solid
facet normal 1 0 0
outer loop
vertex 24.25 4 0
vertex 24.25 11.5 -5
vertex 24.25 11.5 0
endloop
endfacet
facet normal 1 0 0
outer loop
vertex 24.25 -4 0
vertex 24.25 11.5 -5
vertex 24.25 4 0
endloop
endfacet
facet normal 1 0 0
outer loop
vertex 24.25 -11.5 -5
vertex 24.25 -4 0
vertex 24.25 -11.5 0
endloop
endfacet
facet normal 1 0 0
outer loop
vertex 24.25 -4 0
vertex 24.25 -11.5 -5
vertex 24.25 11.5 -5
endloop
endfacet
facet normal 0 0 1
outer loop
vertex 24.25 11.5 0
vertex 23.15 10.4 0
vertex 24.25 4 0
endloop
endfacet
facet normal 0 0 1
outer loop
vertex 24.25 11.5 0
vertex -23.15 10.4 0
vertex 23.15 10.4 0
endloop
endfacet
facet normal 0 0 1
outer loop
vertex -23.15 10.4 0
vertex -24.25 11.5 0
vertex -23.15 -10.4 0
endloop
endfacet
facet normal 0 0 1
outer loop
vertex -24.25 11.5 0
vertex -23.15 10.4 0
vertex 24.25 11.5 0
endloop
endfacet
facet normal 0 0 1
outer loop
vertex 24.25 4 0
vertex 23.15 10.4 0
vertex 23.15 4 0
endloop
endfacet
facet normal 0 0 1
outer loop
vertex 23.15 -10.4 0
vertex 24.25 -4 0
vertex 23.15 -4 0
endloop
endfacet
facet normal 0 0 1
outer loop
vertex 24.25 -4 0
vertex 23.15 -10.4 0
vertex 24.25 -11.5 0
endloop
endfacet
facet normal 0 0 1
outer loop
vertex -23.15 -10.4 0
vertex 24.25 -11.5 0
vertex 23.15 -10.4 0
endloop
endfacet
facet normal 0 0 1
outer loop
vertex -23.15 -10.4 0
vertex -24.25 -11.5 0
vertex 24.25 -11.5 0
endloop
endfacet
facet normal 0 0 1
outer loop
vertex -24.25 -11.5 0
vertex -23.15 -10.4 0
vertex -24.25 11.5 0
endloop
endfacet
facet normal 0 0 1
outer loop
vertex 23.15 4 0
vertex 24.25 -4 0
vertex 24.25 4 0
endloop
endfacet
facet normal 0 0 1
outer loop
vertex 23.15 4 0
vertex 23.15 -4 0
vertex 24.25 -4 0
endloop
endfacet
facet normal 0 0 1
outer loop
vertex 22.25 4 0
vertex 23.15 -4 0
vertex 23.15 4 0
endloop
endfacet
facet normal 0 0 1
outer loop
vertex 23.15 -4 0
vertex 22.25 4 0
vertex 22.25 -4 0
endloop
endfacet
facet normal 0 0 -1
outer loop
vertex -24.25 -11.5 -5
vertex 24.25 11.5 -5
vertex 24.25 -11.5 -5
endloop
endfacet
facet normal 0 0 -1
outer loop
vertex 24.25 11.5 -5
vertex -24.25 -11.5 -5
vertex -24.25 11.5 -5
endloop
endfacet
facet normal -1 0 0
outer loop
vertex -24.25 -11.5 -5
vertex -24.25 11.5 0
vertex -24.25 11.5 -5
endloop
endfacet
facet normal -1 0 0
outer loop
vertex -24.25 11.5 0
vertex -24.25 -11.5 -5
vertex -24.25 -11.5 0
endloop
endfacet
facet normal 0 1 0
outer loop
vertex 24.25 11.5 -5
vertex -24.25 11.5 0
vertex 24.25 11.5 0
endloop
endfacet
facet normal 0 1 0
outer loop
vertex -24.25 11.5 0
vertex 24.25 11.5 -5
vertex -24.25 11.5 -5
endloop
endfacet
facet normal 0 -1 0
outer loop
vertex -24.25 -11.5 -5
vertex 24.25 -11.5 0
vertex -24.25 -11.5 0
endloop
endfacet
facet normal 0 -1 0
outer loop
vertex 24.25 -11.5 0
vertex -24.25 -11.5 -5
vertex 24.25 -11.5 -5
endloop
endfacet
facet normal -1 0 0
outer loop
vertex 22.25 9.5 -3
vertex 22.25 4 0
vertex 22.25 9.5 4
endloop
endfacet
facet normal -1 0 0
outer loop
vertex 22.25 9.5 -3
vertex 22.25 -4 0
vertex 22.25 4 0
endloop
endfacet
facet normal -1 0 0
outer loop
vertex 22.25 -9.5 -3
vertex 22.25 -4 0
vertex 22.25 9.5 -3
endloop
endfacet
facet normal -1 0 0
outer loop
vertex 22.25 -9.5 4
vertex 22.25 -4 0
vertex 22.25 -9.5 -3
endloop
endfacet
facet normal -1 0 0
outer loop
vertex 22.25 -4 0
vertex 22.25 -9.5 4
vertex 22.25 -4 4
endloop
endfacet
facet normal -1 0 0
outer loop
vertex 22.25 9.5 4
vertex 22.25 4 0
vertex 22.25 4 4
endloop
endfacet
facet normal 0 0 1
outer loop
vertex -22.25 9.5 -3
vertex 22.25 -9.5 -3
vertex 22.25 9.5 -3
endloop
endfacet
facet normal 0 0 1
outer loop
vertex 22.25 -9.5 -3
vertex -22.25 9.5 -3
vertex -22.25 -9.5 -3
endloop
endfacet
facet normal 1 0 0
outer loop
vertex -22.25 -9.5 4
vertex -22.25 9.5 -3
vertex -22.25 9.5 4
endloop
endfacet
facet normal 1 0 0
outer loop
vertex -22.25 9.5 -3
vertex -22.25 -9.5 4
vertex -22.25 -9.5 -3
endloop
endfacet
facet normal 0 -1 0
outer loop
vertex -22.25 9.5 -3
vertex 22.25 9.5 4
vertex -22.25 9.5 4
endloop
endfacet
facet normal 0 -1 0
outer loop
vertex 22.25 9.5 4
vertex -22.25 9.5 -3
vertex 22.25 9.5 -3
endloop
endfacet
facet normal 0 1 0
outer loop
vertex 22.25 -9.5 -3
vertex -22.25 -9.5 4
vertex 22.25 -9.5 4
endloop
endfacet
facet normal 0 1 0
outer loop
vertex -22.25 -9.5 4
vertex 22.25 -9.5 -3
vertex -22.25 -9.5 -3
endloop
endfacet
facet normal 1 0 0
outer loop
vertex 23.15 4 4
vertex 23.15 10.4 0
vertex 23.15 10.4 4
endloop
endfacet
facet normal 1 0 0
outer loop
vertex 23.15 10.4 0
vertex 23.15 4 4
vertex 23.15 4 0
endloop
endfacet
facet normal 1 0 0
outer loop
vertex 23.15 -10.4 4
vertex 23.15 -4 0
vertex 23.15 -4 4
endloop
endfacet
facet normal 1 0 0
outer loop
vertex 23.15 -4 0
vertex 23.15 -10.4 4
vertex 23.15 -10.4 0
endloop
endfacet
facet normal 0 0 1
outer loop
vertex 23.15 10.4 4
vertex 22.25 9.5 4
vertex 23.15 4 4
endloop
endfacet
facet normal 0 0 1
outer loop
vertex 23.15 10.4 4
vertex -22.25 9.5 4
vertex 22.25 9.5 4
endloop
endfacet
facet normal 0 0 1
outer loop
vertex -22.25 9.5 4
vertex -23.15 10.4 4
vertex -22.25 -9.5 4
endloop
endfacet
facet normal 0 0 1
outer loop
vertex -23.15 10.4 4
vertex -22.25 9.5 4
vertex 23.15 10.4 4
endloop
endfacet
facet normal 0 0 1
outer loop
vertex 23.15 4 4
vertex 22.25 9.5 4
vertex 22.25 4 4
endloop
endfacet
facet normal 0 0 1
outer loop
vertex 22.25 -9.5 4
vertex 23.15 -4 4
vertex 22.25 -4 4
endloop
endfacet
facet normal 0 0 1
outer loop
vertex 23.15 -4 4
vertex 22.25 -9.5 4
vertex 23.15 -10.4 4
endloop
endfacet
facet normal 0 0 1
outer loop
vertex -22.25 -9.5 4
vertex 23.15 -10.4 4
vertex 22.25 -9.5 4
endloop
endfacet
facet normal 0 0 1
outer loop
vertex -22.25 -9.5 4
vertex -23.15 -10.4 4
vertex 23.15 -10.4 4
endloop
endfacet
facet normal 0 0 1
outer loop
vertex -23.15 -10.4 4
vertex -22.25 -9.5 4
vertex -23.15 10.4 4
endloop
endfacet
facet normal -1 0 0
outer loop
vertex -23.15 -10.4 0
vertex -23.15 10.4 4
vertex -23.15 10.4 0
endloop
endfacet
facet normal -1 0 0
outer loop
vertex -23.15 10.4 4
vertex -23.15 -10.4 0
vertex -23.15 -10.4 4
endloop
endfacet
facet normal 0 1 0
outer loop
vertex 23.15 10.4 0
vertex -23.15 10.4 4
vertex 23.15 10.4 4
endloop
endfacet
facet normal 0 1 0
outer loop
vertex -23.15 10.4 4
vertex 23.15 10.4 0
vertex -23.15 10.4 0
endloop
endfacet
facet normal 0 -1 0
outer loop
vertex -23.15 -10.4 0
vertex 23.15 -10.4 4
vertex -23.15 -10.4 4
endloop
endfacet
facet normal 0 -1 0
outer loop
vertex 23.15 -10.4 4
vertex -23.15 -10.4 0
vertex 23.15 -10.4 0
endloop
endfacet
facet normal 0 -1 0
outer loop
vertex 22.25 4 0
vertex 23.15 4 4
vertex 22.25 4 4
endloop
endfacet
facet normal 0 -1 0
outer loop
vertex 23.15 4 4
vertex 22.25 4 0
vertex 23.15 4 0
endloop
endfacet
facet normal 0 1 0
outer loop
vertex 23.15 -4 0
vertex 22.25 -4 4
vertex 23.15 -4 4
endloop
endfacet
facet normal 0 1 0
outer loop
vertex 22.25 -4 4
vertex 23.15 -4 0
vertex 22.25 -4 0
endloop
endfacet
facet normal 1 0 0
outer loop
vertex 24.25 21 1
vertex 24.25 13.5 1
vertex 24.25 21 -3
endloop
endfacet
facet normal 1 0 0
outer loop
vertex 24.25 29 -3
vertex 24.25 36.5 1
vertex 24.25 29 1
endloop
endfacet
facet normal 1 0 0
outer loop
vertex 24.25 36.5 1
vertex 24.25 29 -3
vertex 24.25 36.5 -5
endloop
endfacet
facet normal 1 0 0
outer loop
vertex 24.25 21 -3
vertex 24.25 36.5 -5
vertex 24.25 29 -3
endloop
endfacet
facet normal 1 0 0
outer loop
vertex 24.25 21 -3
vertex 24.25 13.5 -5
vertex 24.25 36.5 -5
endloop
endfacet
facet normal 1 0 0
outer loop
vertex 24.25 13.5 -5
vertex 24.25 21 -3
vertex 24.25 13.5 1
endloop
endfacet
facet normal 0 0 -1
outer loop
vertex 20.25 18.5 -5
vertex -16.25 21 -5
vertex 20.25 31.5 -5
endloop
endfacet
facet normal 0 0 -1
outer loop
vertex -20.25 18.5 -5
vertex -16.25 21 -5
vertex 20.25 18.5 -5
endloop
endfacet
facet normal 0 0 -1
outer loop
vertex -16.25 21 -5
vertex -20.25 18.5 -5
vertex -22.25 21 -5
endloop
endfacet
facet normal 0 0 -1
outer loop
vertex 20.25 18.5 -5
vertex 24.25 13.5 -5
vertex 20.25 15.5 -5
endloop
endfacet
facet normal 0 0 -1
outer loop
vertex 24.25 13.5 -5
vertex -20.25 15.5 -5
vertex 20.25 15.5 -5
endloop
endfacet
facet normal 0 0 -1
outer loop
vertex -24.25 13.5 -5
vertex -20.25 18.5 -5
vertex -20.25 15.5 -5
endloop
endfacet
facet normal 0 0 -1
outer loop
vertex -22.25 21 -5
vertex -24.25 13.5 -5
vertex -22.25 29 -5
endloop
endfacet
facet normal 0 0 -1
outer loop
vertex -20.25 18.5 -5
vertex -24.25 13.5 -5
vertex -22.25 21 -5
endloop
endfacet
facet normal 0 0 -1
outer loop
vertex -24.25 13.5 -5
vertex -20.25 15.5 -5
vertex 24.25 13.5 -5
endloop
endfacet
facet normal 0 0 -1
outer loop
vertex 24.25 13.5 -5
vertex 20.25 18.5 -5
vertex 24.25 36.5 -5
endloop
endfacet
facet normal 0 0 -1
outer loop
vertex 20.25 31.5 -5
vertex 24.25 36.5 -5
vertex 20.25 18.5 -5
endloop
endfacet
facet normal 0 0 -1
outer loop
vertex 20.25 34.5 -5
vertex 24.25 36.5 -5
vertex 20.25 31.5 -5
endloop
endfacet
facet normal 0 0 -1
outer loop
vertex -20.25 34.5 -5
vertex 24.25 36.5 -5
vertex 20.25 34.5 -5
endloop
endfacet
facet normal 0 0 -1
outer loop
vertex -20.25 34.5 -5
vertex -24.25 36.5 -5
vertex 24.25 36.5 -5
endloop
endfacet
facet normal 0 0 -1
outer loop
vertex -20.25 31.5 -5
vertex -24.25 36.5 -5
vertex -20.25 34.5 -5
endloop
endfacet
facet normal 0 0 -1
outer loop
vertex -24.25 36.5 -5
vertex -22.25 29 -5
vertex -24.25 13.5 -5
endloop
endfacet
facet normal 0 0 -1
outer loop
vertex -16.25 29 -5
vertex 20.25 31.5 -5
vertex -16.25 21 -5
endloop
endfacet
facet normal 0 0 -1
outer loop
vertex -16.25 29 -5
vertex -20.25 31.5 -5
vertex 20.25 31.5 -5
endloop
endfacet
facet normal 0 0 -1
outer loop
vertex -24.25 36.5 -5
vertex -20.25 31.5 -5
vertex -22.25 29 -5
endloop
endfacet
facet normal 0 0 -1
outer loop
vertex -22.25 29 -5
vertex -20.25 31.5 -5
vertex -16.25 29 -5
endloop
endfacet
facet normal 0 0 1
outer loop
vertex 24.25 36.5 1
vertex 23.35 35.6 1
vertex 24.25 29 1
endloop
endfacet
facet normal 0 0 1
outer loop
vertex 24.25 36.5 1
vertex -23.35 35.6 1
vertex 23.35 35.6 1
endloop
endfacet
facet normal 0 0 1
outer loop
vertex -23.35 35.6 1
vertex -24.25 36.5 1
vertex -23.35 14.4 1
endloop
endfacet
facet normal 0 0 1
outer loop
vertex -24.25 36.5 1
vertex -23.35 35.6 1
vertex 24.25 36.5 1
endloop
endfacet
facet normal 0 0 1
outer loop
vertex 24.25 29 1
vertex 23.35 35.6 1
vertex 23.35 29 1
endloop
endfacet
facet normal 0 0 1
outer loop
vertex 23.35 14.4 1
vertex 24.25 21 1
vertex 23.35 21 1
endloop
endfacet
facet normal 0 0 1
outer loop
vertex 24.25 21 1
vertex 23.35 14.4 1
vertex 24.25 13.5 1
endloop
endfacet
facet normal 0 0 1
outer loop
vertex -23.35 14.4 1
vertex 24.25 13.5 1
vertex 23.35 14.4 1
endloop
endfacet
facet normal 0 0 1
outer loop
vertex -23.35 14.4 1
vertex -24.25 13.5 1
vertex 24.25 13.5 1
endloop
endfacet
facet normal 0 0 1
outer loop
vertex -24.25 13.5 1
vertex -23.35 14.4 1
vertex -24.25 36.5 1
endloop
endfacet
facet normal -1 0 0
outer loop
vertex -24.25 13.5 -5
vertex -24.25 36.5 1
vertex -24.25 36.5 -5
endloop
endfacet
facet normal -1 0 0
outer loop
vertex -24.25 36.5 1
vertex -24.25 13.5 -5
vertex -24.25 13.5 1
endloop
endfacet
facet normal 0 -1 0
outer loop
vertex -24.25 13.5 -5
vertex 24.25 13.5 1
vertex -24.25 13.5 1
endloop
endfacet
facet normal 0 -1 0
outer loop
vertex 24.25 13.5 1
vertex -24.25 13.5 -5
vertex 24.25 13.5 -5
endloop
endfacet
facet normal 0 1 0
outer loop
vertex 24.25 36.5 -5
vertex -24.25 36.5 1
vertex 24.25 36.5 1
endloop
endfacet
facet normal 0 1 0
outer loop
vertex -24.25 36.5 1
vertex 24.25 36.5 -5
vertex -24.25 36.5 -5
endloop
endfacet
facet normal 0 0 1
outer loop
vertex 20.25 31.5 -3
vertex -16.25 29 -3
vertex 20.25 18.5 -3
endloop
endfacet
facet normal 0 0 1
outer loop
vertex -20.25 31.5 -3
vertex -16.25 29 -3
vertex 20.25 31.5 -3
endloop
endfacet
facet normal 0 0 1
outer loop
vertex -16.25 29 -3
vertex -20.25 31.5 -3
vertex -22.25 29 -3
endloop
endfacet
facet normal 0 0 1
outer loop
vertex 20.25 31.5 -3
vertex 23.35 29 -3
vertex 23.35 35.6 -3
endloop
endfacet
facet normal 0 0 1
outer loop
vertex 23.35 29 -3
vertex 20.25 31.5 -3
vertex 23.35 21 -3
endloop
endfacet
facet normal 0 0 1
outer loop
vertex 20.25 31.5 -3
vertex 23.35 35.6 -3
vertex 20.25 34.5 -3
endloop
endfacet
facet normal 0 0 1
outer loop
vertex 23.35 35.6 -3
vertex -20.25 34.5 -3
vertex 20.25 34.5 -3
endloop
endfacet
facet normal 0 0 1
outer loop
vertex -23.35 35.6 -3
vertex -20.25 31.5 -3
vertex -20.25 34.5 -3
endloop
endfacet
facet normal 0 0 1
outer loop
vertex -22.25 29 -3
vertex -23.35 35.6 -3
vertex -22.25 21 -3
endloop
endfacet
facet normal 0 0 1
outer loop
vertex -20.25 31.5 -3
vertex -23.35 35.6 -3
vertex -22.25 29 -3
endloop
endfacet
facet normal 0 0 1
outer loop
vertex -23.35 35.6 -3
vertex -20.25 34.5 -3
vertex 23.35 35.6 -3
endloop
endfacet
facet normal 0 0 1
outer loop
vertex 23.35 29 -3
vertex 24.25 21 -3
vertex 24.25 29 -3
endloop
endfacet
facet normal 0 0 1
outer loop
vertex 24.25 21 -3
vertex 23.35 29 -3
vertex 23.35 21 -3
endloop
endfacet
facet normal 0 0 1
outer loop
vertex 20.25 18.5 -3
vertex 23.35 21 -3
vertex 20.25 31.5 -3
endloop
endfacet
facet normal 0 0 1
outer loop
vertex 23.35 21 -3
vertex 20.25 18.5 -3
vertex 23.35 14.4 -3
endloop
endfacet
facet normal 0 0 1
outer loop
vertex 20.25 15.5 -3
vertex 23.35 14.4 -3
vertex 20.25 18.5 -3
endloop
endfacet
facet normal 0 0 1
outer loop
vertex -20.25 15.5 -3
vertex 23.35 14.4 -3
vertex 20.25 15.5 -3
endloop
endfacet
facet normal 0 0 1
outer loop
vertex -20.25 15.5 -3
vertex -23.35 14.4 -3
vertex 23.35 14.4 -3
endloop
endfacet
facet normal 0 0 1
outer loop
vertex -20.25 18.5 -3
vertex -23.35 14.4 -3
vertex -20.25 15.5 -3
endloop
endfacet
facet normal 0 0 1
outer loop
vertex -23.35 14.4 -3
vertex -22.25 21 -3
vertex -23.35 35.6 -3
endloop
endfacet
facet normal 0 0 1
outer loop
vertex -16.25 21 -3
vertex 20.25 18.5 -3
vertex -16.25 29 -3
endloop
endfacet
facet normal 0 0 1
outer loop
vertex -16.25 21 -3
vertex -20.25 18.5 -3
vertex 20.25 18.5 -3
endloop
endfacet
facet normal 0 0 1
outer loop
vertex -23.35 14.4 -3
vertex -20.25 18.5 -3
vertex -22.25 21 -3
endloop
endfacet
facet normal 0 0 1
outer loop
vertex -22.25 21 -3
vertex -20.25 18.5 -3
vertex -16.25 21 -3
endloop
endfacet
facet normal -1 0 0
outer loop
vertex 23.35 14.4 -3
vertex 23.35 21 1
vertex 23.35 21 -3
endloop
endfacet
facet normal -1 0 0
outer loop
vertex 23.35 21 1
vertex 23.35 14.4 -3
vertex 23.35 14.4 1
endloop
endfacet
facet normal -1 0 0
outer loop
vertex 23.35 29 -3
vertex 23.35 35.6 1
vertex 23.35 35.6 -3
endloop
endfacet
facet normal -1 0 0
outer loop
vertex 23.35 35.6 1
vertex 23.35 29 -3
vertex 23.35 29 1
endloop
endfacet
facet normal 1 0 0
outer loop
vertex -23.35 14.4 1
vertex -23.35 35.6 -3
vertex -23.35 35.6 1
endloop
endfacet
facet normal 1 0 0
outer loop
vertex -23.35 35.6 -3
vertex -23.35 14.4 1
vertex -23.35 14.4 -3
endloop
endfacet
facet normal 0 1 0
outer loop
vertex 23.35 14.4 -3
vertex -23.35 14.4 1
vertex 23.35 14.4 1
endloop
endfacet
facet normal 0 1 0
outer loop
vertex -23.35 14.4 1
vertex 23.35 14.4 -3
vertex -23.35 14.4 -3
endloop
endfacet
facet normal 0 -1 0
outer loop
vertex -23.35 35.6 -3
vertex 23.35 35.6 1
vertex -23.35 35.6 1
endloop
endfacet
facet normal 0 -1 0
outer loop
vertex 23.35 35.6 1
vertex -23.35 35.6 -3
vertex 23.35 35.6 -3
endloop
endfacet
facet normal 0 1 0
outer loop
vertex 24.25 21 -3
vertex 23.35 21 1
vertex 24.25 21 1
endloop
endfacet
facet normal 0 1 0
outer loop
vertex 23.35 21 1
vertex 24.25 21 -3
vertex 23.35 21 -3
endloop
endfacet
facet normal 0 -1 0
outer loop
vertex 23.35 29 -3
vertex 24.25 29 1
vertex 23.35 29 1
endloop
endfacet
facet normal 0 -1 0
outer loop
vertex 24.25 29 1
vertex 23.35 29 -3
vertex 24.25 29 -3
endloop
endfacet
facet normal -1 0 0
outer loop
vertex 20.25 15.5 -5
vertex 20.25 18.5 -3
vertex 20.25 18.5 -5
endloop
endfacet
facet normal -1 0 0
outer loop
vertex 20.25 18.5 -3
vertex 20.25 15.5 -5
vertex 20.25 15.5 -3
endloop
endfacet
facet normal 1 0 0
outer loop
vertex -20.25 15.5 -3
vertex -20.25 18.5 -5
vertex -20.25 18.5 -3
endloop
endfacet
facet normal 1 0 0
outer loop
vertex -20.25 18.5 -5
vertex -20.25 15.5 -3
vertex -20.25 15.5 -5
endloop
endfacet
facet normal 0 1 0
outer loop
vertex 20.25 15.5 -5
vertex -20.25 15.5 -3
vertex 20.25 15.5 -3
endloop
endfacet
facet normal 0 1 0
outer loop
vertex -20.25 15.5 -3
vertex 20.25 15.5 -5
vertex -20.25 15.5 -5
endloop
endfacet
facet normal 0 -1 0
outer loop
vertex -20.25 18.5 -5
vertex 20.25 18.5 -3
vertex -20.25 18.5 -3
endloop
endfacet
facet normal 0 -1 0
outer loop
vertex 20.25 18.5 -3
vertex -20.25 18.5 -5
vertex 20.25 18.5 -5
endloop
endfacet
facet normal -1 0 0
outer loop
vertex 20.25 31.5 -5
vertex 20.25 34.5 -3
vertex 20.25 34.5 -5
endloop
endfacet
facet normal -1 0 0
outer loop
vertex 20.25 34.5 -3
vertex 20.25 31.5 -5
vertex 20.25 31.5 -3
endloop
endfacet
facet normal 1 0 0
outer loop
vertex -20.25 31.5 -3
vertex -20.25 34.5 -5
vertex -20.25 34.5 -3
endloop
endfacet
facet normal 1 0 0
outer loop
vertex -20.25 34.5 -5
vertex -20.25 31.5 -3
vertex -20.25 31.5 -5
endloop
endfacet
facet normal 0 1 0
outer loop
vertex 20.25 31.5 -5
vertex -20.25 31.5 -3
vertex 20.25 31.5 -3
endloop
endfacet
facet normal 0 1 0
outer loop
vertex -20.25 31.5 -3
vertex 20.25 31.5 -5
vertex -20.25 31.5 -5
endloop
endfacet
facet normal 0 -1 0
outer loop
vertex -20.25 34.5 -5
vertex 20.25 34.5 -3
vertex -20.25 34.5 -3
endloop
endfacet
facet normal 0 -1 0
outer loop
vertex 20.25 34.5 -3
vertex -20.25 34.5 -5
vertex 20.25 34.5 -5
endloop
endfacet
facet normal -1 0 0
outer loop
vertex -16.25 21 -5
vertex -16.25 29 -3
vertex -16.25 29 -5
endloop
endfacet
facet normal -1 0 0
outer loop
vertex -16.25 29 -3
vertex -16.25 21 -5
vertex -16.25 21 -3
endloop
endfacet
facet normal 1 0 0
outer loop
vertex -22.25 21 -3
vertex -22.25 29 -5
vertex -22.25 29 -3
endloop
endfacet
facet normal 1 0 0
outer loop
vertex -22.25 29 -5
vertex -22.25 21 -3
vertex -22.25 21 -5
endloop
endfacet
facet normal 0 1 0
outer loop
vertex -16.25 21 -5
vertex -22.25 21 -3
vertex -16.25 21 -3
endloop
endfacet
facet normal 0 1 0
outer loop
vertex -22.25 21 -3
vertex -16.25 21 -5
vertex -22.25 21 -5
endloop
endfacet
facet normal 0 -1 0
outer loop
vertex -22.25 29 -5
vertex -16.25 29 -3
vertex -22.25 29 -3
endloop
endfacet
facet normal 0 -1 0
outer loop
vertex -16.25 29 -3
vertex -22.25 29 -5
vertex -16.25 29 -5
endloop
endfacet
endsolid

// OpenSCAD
arduino_w=19;//18;
arduino_l=44.5;//43;
arduino_lower_h=3;
arduino_upper_h=4;

h_sum = arduino_lower_h+arduino_upper_h;


usb_w=8;

side_w=3;
v_side_offset=2;

v_w=8;
v_h=6;


arduino_thickness=2;

tol=0.1;

arduino_outer_w=arduino_w +2*arduino_thickness;
arduino_outer_l=arduino_l +2*arduino_thickness;
arduino_outer_h=h_sum     +2*arduino_thickness;

arduino_case_bottom();

 translate([0,arduino_w+arduino_thickness*3,arduino_upper_h-arduino_lower_h])
rotate([180,0,0])
arduino_case_top();



module arduino_case_top(){
    difference(){
        translate([0,0,arduino_upper_h/2])
        difference(){
            translate([0,0,arduino_thickness/2])
            cube([arduino_l+2*arduino_thickness,arduino_w+2*arduino_thickness,arduino_upper_h+arduino_thickness],center=true);
            cube([arduino_l,arduino_w,arduino_upper_h],center=true);
        }
        connector(-tol);
        usb();
        side(1);
        side(-1);

        translate([-arduino_l/2+v_h/2,0,(arduino_upper_h+arduino_thickness)/2])
        cube([v_h,v_w,arduino_upper_h+arduino_thickness],center=true);
    }
}

module side(converter=1){
    translate([0,converter/2*(arduino_w-side_w),(arduino_upper_h+arduino_thickness)/2])
    cube([arduino_l-2*v_side_offset,side_w,arduino_upper_h+arduino_thickness],center=true);
}

module arduino_case_bottom(){
    difference(){
        union(){
            translate([0,0,-arduino_lower_h/2])
            difference(){
                translate([0,0,-arduino_thickness/2])
                cube([arduino_l+2*arduino_thickness,arduino_w+2*arduino_thickness,arduino_lower_h+arduino_thickness],center=true);
                cube([arduino_l,arduino_w,arduino_lower_h],center=true);
            }
            connector(tol);
        }
        usb();
    }
}


module usb(){
    translate([(arduino_l+arduino_thickness)/2,0,arduino_upper_h/2])
    cube([arduino_thickness,usb_w,arduino_upper_h],center=true);
}

module connector(tol){
    translate([0,0,arduino_upper_h/2])
    difference(){
        cube([arduino_l+arduino_thickness-tol*2,arduino_w+arduino_thickness-tol*2,arduino_upper_h],center=true);
        cube([arduino_l,arduino_w,arduino_upper_h],center=true);
    }
}
